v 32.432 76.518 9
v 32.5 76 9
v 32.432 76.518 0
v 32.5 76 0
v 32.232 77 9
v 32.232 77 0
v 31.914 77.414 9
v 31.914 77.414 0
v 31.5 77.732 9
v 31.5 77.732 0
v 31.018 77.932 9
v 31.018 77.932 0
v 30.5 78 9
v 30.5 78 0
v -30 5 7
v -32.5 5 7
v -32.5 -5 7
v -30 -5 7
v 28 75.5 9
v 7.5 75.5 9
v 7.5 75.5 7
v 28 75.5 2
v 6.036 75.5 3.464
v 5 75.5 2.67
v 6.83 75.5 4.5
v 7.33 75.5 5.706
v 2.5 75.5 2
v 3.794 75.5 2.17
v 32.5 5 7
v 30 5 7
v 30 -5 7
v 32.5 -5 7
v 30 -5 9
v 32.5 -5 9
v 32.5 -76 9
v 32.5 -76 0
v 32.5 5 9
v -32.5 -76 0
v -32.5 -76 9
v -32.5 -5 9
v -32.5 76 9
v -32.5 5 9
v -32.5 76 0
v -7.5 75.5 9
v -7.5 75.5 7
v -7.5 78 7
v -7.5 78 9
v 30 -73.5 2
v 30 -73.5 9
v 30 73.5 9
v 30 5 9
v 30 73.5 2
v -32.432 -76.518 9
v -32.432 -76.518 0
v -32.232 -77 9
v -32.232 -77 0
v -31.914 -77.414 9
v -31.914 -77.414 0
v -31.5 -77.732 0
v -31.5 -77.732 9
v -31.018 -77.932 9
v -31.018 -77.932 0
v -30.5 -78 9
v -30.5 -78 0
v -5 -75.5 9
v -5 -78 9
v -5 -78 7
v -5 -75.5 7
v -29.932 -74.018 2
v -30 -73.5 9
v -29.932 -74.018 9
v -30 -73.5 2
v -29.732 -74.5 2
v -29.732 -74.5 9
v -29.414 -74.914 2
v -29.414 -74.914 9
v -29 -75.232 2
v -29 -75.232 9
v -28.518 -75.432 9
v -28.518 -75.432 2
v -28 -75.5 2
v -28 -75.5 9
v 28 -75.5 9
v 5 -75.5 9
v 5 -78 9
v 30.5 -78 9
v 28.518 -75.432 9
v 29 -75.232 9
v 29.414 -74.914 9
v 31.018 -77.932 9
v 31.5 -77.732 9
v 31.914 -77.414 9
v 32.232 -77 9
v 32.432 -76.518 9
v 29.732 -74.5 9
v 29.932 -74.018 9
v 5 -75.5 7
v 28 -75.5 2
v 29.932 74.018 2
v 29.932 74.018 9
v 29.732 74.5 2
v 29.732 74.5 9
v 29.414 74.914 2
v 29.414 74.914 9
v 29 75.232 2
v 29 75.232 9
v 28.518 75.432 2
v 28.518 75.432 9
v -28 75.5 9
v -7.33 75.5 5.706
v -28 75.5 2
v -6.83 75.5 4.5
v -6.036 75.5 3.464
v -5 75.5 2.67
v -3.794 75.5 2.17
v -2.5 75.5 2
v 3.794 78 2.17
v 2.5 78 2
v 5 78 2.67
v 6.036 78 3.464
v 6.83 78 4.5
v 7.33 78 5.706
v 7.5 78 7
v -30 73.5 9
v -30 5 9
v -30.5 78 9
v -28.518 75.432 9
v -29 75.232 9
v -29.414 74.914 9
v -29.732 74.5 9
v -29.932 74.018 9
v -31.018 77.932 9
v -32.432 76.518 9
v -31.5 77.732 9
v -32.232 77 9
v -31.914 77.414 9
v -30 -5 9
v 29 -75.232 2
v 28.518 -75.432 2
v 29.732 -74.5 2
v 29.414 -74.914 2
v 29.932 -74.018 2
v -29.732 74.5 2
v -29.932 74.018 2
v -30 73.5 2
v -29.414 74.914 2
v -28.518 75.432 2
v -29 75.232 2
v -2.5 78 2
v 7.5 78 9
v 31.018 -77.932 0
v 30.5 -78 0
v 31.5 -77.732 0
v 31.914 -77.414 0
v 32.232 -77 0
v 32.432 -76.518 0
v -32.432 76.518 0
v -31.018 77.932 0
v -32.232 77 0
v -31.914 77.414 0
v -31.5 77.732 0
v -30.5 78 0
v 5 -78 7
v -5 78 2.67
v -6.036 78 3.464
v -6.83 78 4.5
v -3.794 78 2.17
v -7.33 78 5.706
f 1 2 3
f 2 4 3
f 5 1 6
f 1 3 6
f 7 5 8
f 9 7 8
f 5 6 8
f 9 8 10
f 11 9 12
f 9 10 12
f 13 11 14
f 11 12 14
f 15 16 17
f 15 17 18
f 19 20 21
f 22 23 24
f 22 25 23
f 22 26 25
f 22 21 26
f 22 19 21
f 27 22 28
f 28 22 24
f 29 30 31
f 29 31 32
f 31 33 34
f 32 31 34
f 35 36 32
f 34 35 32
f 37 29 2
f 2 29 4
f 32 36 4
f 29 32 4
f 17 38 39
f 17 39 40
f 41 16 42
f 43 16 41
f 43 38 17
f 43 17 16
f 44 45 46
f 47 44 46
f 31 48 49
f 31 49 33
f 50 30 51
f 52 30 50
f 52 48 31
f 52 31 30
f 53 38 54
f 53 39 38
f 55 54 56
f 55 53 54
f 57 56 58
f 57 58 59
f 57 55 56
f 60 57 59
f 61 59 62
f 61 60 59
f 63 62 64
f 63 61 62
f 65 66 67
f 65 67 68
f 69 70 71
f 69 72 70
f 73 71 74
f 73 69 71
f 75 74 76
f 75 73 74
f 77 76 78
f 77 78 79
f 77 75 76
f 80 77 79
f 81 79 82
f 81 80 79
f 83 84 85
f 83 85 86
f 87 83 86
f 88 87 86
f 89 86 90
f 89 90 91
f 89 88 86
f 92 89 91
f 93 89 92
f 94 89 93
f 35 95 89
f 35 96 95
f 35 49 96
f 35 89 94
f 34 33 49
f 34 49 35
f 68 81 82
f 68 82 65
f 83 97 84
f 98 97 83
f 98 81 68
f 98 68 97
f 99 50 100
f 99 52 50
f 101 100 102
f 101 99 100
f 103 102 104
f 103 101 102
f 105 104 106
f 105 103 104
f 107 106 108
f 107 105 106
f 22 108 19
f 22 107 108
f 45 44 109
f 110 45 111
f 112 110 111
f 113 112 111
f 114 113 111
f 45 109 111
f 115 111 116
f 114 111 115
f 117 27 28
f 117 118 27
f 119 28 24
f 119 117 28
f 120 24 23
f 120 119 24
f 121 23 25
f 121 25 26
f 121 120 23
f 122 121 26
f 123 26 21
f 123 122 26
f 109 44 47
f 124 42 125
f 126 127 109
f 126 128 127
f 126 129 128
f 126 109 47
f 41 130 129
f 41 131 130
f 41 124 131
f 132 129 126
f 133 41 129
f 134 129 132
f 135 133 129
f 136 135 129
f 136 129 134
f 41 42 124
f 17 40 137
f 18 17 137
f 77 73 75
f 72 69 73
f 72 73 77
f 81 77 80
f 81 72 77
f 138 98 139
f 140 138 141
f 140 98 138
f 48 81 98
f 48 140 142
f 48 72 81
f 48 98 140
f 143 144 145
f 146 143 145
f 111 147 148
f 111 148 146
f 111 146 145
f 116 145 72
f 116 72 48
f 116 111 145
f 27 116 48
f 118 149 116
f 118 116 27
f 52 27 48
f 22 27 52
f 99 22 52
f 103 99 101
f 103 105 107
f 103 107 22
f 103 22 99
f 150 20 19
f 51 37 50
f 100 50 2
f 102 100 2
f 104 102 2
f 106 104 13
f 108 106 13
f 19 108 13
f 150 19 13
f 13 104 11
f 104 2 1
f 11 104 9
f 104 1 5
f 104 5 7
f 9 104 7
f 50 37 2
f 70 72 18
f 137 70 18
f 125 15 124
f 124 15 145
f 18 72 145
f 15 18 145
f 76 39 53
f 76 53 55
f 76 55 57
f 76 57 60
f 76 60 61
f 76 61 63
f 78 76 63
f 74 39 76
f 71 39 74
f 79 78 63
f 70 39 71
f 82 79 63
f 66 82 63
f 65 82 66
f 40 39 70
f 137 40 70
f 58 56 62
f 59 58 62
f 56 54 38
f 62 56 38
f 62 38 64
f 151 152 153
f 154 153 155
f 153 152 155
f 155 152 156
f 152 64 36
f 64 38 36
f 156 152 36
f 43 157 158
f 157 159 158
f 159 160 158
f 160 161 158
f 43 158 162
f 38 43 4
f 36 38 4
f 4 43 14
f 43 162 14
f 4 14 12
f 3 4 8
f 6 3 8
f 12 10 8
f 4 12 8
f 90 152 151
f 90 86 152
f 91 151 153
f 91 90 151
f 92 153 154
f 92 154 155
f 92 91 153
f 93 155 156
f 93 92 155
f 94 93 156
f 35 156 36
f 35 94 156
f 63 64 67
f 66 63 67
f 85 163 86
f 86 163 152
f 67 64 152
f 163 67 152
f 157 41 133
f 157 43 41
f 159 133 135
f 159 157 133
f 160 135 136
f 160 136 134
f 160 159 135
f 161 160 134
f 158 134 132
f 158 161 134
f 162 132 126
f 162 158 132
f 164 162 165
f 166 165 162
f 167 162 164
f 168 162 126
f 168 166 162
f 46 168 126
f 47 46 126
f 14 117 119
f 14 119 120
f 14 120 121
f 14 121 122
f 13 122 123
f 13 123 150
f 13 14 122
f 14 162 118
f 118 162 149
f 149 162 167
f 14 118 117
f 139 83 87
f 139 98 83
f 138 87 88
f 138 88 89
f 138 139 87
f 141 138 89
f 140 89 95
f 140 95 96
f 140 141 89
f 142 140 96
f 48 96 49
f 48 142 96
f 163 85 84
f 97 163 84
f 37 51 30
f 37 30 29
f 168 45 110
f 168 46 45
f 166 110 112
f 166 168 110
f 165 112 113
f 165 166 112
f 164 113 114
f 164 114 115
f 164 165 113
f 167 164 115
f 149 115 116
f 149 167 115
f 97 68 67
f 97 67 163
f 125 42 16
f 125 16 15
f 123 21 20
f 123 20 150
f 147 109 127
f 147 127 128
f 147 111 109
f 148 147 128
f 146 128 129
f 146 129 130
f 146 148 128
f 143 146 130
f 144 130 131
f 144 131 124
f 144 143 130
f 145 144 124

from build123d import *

# Parameters (mm, degrees)
F0_W      = 65
F0_H      = 156
F0_W_2    = 60
F0_H_2    = 151
F1_DEPTH  = 2
F2_DEPTH  = 7
F3_W      = 10
F3_H      = 2.5
F4_DEPTH  = 5
F5_DEPTH  = 2
F6_R      = 2
F7_R      = 2
F8_W      = 5
F8_H      = 2.5
F8_W_2    = 2.5
F8_H_2    = 5
F9_DEPTH  = 2
F10_DEPTH = 2.5
F11_DEPTH = 2.5
F12_R     = 5


with BuildPart() as f1:
    # F0 (on Top) → F1 (new body)
    with BuildSketch(Plane.XY):
        Rectangle(F0_W, F0_H)
        Rectangle(F0_W_2, F0_H_2, mode=Mode.SUBTRACT)
        Rectangle(F0_W_2, F0_H_2)
    extrude(amount=F1_DEPTH)

    # F0 (on Top) → F2 (join)
    with BuildSketch(Plane.XY):
        Rectangle(F0_W, F0_H)
        Rectangle(F0_W_2, F0_H_2, mode=Mode.SUBTRACT)
    extrude(amount=F2_DEPTH)

    # F3 (on face) → F4 (cut, through all)
    with BuildSketch(Plane.XY.offset(7)):
        with Locations((5, 76.75)):
            Rectangle(F3_W, F3_H)
        with Locations((-5, 76.75)):
            Rectangle(F3_W, F3_H)
    extrude(amount=-F4_DEPTH, mode=Mode.SUBTRACT)

    # F5 (add): a face of the model
    f5_faces = [f1.faces().sort_by_distance(p)[0] for p in [
        (0, -76.31, 7),
    ]]
    extrude(f5_faces, amount=F5_DEPTH)

    # F6
    f6_edges = [f1.edges().sort_by_distance(p)[0] for p in [
        (-32.5, 78, 4.5),
        (32.5, 78, 4.5),
        (32.5, -78, 4.5),
        (-32.5, -78, 4.5),
    ]]
    fillet(f6_edges, radius=F6_R)

    # F7
    f7_edges = [f1.edges().sort_by_distance(p)[0] for p in [
        (-30, 75.5, 5.5),
        (30, 75.5, 5.5),
        (30, -75.5, 5.5),
        (-30, -75.5, 5.5),
    ]]
    fillet(f7_edges, radius=F7_R)

    # F8 (on face) → F9 (cut)
    with BuildSketch(Plane.XY.offset(9)):
        with Locations((2.5, -76.75)):
            Rectangle(F8_W, F8_H)
        with Locations((-2.5, -76.75)):
            Rectangle(F8_W, F8_H)
        with Locations((-31.25, 2.5)):
            Rectangle(F8_W_2, F8_H_2)
        with Locations((-31.25, -2.5)):
            Rectangle(F8_W_2, F8_H_2)
        with Locations((31.25, 2.5)):
            Rectangle(F8_W_2, F8_H_2)
        with Locations((31.25, -2.5)):
            Rectangle(F8_W_2, F8_H_2)
    extrude(amount=-F9_DEPTH, mode=Mode.SUBTRACT)

    # F10 (add): a face of the model
    f10_faces = [f1.faces().sort_by_distance(p)[0] for p in [
        (-10, 76.75, 5.5),
    ]]
    extrude(f10_faces, amount=F10_DEPTH)

    # F11 (add): a face of the model
    f11_faces = [f1.faces().sort_by_distance(p)[0] for p in [
        (10, 76.75, 5.5),
    ]]
    extrude(f11_faces, amount=F11_DEPTH)

    # F12
    f12_edges = [f1.edges().sort_by_distance(p)[0] for p in [
        (7.5, 76.75, 2),
        (-7.5, 76.75, 2),
    ]]
    fillet(f12_edges, radius=F12_R)


solid = f1.part
